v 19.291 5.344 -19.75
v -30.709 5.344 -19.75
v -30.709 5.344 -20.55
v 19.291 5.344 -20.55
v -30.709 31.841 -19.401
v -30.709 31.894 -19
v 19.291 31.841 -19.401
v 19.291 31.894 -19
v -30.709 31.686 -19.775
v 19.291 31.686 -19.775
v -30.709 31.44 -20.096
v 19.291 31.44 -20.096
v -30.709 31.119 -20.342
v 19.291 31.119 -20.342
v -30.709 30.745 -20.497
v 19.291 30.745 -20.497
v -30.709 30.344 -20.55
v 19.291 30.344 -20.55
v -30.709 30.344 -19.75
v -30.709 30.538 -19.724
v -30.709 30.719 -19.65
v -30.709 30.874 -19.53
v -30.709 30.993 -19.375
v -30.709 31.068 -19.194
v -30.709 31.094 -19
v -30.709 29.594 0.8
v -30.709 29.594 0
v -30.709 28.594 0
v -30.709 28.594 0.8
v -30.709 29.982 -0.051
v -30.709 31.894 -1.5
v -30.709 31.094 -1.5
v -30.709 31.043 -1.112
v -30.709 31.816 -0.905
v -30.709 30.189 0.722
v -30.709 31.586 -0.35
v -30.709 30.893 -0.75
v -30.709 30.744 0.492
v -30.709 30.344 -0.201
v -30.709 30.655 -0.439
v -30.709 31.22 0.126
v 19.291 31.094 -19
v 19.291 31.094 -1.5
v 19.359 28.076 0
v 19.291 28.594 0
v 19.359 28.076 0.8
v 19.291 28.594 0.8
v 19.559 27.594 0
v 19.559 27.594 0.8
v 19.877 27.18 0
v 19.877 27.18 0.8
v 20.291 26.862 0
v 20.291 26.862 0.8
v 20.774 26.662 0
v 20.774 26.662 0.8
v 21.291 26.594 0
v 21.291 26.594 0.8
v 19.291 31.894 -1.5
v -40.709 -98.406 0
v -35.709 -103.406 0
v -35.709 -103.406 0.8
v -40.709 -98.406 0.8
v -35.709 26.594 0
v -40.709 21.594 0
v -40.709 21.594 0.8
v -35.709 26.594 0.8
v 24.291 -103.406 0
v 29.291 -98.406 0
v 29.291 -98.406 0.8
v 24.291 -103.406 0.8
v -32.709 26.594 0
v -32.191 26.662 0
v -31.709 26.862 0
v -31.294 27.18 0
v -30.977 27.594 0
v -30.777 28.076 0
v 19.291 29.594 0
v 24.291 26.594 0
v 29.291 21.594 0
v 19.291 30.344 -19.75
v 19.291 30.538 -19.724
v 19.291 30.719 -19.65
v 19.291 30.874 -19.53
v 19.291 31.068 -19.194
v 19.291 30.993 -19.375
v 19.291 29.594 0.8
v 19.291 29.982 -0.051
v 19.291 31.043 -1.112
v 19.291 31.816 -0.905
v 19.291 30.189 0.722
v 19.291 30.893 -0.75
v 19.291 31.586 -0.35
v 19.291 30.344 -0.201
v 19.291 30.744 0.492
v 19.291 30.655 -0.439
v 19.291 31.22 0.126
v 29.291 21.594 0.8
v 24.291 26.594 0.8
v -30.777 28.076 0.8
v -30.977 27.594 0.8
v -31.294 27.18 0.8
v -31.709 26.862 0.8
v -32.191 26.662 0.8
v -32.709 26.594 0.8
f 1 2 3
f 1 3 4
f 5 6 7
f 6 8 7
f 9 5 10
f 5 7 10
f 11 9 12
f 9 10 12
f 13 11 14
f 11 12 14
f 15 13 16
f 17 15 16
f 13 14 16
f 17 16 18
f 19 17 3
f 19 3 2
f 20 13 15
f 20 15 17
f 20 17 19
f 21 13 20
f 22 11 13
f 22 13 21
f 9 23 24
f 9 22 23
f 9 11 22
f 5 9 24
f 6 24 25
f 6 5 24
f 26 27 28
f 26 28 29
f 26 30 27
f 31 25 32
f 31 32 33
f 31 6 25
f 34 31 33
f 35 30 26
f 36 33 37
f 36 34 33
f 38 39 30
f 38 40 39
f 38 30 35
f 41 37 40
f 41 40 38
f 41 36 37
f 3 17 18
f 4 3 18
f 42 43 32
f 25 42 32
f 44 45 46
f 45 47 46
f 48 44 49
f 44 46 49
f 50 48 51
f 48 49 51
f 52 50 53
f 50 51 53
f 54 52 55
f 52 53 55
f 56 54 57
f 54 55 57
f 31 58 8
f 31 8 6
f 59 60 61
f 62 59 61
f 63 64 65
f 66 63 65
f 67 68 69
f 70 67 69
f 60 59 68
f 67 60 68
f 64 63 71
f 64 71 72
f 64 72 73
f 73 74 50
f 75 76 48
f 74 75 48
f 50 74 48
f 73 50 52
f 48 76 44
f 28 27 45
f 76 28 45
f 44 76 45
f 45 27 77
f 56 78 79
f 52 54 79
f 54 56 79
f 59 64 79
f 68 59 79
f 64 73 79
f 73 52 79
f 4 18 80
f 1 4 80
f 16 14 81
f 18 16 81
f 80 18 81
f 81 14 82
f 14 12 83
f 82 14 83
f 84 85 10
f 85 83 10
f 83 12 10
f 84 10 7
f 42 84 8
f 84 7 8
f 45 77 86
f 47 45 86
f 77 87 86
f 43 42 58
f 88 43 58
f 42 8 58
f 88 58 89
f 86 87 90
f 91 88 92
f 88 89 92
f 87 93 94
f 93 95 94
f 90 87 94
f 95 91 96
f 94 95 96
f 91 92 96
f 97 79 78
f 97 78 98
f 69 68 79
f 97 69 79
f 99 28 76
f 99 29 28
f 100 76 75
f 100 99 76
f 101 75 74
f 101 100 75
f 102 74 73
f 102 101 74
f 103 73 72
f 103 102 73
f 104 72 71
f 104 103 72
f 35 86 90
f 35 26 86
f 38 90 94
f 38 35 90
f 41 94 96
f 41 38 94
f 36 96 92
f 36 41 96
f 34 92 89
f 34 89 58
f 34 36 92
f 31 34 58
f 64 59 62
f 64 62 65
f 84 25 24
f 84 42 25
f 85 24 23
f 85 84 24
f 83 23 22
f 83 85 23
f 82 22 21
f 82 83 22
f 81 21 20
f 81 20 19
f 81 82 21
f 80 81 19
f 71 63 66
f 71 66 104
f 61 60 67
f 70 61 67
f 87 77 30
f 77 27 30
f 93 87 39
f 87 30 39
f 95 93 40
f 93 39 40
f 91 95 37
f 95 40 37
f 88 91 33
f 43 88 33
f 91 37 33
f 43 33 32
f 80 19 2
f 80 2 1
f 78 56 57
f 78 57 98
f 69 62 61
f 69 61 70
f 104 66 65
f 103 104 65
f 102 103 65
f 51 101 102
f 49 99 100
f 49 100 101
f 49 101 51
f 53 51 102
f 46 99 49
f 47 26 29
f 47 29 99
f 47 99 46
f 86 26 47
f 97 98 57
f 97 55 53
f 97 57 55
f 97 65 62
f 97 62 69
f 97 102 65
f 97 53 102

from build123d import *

# Parameters (mm, degrees)
F0_W      = 70
F0_H      = 130
F1_DEPTH  = 0.8
F2_SIZE   = 5
F3_W      = 50
F3_H      = 0.8
F4_DEPTH  = 3
F5_W      = 50
F5_H      = 0.8
F6_ANGLE  = 90
F7_DEPTH  = 17.5
F8_W      = 50
F8_H      = 0.8
F9_ANGLE  = 90
F10_DEPTH = 25
F11_R     = 2


with BuildPart() as f1:
    # F0 (on Top) → F1 (new body)
    with BuildSketch(Plane.XY):
        with Locations((-5.7087102905, -38.4061143195)):
            Rectangle(F0_W, F0_H)
    extrude(amount=F1_DEPTH)

    # F2
    f2_edges = [f1.edges().sort_by_distance(p)[0] for p in [
        (-40.70871, -103.406114, 0.4),
        (29.29129, -103.406114, 0.4),
        (29.29129, 26.593886, 0.4),
        (-40.70871, 26.593886, 0.4),
    ]]
    chamfer(f2_edges, length=F2_SIZE)

    # F3 (on face) → F4 (join)
    with BuildSketch(Plane(origin=(0, 26.5938856805, 0), x_dir=(-1, 0, 0), z_dir=(0, 1, 0))):
        with Locations((5.7087102905, 0.4)):
            Rectangle(F3_W, F3_H)
    extrude(amount=F4_DEPTH)

    # F5 (on face) → F6 (revolve)
    with BuildSketch(Plane(origin=(0, 29.5938856805, 0), x_dir=(-1, 0, 0), z_dir=(0, 1, 0))):
        with Locations((5.7087102905, 0.4)):
            Rectangle(F5_W, F5_H)
    revolve(axis=Axis((-7.0197554305, 29.5938856805, -1.5), (-1, 0, 0)), revolution_arc=F6_ANGLE)

    # F7 (add): a face of the model
    f7_faces = [f1.faces().sort_by_distance(p)[0] for p in [
        (-5.7087102905, 31.4938856805, -1.5),
    ]]
    extrude(f7_faces, amount=F7_DEPTH)

    # F8 (on face) → F9 (revolve)
    with BuildSketch(Plane(origin=(0, 0, -19), x_dir=(1, 0, 0), z_dir=(0, 0, -1))):
        with Locations((-5.7087102905, -31.4938856805)):
            Rectangle(F8_W, F8_H)
    revolve(axis=Axis((-5.6677348912, 30.3438856805, -19), (-1, 0, 0)), revolution_arc=F9_ANGLE)

    # F10 (add): a face of the model
    f10_faces = [f1.faces().sort_by_distance(p)[0] for p in [
        (-5.7087102905, 30.3438856805, -20.15),
    ]]
    extrude(f10_faces, amount=F10_DEPTH)

    # F11
    f11_edges = [f1.edges().sort_by_distance(p)[0] for p in [
        (-30.70871, 26.593886, 0.4),
        (19.29129, 26.593886, 0.4),
    ]]
    fillet(f11_edges, radius=F11_R)


solid = f1.part
